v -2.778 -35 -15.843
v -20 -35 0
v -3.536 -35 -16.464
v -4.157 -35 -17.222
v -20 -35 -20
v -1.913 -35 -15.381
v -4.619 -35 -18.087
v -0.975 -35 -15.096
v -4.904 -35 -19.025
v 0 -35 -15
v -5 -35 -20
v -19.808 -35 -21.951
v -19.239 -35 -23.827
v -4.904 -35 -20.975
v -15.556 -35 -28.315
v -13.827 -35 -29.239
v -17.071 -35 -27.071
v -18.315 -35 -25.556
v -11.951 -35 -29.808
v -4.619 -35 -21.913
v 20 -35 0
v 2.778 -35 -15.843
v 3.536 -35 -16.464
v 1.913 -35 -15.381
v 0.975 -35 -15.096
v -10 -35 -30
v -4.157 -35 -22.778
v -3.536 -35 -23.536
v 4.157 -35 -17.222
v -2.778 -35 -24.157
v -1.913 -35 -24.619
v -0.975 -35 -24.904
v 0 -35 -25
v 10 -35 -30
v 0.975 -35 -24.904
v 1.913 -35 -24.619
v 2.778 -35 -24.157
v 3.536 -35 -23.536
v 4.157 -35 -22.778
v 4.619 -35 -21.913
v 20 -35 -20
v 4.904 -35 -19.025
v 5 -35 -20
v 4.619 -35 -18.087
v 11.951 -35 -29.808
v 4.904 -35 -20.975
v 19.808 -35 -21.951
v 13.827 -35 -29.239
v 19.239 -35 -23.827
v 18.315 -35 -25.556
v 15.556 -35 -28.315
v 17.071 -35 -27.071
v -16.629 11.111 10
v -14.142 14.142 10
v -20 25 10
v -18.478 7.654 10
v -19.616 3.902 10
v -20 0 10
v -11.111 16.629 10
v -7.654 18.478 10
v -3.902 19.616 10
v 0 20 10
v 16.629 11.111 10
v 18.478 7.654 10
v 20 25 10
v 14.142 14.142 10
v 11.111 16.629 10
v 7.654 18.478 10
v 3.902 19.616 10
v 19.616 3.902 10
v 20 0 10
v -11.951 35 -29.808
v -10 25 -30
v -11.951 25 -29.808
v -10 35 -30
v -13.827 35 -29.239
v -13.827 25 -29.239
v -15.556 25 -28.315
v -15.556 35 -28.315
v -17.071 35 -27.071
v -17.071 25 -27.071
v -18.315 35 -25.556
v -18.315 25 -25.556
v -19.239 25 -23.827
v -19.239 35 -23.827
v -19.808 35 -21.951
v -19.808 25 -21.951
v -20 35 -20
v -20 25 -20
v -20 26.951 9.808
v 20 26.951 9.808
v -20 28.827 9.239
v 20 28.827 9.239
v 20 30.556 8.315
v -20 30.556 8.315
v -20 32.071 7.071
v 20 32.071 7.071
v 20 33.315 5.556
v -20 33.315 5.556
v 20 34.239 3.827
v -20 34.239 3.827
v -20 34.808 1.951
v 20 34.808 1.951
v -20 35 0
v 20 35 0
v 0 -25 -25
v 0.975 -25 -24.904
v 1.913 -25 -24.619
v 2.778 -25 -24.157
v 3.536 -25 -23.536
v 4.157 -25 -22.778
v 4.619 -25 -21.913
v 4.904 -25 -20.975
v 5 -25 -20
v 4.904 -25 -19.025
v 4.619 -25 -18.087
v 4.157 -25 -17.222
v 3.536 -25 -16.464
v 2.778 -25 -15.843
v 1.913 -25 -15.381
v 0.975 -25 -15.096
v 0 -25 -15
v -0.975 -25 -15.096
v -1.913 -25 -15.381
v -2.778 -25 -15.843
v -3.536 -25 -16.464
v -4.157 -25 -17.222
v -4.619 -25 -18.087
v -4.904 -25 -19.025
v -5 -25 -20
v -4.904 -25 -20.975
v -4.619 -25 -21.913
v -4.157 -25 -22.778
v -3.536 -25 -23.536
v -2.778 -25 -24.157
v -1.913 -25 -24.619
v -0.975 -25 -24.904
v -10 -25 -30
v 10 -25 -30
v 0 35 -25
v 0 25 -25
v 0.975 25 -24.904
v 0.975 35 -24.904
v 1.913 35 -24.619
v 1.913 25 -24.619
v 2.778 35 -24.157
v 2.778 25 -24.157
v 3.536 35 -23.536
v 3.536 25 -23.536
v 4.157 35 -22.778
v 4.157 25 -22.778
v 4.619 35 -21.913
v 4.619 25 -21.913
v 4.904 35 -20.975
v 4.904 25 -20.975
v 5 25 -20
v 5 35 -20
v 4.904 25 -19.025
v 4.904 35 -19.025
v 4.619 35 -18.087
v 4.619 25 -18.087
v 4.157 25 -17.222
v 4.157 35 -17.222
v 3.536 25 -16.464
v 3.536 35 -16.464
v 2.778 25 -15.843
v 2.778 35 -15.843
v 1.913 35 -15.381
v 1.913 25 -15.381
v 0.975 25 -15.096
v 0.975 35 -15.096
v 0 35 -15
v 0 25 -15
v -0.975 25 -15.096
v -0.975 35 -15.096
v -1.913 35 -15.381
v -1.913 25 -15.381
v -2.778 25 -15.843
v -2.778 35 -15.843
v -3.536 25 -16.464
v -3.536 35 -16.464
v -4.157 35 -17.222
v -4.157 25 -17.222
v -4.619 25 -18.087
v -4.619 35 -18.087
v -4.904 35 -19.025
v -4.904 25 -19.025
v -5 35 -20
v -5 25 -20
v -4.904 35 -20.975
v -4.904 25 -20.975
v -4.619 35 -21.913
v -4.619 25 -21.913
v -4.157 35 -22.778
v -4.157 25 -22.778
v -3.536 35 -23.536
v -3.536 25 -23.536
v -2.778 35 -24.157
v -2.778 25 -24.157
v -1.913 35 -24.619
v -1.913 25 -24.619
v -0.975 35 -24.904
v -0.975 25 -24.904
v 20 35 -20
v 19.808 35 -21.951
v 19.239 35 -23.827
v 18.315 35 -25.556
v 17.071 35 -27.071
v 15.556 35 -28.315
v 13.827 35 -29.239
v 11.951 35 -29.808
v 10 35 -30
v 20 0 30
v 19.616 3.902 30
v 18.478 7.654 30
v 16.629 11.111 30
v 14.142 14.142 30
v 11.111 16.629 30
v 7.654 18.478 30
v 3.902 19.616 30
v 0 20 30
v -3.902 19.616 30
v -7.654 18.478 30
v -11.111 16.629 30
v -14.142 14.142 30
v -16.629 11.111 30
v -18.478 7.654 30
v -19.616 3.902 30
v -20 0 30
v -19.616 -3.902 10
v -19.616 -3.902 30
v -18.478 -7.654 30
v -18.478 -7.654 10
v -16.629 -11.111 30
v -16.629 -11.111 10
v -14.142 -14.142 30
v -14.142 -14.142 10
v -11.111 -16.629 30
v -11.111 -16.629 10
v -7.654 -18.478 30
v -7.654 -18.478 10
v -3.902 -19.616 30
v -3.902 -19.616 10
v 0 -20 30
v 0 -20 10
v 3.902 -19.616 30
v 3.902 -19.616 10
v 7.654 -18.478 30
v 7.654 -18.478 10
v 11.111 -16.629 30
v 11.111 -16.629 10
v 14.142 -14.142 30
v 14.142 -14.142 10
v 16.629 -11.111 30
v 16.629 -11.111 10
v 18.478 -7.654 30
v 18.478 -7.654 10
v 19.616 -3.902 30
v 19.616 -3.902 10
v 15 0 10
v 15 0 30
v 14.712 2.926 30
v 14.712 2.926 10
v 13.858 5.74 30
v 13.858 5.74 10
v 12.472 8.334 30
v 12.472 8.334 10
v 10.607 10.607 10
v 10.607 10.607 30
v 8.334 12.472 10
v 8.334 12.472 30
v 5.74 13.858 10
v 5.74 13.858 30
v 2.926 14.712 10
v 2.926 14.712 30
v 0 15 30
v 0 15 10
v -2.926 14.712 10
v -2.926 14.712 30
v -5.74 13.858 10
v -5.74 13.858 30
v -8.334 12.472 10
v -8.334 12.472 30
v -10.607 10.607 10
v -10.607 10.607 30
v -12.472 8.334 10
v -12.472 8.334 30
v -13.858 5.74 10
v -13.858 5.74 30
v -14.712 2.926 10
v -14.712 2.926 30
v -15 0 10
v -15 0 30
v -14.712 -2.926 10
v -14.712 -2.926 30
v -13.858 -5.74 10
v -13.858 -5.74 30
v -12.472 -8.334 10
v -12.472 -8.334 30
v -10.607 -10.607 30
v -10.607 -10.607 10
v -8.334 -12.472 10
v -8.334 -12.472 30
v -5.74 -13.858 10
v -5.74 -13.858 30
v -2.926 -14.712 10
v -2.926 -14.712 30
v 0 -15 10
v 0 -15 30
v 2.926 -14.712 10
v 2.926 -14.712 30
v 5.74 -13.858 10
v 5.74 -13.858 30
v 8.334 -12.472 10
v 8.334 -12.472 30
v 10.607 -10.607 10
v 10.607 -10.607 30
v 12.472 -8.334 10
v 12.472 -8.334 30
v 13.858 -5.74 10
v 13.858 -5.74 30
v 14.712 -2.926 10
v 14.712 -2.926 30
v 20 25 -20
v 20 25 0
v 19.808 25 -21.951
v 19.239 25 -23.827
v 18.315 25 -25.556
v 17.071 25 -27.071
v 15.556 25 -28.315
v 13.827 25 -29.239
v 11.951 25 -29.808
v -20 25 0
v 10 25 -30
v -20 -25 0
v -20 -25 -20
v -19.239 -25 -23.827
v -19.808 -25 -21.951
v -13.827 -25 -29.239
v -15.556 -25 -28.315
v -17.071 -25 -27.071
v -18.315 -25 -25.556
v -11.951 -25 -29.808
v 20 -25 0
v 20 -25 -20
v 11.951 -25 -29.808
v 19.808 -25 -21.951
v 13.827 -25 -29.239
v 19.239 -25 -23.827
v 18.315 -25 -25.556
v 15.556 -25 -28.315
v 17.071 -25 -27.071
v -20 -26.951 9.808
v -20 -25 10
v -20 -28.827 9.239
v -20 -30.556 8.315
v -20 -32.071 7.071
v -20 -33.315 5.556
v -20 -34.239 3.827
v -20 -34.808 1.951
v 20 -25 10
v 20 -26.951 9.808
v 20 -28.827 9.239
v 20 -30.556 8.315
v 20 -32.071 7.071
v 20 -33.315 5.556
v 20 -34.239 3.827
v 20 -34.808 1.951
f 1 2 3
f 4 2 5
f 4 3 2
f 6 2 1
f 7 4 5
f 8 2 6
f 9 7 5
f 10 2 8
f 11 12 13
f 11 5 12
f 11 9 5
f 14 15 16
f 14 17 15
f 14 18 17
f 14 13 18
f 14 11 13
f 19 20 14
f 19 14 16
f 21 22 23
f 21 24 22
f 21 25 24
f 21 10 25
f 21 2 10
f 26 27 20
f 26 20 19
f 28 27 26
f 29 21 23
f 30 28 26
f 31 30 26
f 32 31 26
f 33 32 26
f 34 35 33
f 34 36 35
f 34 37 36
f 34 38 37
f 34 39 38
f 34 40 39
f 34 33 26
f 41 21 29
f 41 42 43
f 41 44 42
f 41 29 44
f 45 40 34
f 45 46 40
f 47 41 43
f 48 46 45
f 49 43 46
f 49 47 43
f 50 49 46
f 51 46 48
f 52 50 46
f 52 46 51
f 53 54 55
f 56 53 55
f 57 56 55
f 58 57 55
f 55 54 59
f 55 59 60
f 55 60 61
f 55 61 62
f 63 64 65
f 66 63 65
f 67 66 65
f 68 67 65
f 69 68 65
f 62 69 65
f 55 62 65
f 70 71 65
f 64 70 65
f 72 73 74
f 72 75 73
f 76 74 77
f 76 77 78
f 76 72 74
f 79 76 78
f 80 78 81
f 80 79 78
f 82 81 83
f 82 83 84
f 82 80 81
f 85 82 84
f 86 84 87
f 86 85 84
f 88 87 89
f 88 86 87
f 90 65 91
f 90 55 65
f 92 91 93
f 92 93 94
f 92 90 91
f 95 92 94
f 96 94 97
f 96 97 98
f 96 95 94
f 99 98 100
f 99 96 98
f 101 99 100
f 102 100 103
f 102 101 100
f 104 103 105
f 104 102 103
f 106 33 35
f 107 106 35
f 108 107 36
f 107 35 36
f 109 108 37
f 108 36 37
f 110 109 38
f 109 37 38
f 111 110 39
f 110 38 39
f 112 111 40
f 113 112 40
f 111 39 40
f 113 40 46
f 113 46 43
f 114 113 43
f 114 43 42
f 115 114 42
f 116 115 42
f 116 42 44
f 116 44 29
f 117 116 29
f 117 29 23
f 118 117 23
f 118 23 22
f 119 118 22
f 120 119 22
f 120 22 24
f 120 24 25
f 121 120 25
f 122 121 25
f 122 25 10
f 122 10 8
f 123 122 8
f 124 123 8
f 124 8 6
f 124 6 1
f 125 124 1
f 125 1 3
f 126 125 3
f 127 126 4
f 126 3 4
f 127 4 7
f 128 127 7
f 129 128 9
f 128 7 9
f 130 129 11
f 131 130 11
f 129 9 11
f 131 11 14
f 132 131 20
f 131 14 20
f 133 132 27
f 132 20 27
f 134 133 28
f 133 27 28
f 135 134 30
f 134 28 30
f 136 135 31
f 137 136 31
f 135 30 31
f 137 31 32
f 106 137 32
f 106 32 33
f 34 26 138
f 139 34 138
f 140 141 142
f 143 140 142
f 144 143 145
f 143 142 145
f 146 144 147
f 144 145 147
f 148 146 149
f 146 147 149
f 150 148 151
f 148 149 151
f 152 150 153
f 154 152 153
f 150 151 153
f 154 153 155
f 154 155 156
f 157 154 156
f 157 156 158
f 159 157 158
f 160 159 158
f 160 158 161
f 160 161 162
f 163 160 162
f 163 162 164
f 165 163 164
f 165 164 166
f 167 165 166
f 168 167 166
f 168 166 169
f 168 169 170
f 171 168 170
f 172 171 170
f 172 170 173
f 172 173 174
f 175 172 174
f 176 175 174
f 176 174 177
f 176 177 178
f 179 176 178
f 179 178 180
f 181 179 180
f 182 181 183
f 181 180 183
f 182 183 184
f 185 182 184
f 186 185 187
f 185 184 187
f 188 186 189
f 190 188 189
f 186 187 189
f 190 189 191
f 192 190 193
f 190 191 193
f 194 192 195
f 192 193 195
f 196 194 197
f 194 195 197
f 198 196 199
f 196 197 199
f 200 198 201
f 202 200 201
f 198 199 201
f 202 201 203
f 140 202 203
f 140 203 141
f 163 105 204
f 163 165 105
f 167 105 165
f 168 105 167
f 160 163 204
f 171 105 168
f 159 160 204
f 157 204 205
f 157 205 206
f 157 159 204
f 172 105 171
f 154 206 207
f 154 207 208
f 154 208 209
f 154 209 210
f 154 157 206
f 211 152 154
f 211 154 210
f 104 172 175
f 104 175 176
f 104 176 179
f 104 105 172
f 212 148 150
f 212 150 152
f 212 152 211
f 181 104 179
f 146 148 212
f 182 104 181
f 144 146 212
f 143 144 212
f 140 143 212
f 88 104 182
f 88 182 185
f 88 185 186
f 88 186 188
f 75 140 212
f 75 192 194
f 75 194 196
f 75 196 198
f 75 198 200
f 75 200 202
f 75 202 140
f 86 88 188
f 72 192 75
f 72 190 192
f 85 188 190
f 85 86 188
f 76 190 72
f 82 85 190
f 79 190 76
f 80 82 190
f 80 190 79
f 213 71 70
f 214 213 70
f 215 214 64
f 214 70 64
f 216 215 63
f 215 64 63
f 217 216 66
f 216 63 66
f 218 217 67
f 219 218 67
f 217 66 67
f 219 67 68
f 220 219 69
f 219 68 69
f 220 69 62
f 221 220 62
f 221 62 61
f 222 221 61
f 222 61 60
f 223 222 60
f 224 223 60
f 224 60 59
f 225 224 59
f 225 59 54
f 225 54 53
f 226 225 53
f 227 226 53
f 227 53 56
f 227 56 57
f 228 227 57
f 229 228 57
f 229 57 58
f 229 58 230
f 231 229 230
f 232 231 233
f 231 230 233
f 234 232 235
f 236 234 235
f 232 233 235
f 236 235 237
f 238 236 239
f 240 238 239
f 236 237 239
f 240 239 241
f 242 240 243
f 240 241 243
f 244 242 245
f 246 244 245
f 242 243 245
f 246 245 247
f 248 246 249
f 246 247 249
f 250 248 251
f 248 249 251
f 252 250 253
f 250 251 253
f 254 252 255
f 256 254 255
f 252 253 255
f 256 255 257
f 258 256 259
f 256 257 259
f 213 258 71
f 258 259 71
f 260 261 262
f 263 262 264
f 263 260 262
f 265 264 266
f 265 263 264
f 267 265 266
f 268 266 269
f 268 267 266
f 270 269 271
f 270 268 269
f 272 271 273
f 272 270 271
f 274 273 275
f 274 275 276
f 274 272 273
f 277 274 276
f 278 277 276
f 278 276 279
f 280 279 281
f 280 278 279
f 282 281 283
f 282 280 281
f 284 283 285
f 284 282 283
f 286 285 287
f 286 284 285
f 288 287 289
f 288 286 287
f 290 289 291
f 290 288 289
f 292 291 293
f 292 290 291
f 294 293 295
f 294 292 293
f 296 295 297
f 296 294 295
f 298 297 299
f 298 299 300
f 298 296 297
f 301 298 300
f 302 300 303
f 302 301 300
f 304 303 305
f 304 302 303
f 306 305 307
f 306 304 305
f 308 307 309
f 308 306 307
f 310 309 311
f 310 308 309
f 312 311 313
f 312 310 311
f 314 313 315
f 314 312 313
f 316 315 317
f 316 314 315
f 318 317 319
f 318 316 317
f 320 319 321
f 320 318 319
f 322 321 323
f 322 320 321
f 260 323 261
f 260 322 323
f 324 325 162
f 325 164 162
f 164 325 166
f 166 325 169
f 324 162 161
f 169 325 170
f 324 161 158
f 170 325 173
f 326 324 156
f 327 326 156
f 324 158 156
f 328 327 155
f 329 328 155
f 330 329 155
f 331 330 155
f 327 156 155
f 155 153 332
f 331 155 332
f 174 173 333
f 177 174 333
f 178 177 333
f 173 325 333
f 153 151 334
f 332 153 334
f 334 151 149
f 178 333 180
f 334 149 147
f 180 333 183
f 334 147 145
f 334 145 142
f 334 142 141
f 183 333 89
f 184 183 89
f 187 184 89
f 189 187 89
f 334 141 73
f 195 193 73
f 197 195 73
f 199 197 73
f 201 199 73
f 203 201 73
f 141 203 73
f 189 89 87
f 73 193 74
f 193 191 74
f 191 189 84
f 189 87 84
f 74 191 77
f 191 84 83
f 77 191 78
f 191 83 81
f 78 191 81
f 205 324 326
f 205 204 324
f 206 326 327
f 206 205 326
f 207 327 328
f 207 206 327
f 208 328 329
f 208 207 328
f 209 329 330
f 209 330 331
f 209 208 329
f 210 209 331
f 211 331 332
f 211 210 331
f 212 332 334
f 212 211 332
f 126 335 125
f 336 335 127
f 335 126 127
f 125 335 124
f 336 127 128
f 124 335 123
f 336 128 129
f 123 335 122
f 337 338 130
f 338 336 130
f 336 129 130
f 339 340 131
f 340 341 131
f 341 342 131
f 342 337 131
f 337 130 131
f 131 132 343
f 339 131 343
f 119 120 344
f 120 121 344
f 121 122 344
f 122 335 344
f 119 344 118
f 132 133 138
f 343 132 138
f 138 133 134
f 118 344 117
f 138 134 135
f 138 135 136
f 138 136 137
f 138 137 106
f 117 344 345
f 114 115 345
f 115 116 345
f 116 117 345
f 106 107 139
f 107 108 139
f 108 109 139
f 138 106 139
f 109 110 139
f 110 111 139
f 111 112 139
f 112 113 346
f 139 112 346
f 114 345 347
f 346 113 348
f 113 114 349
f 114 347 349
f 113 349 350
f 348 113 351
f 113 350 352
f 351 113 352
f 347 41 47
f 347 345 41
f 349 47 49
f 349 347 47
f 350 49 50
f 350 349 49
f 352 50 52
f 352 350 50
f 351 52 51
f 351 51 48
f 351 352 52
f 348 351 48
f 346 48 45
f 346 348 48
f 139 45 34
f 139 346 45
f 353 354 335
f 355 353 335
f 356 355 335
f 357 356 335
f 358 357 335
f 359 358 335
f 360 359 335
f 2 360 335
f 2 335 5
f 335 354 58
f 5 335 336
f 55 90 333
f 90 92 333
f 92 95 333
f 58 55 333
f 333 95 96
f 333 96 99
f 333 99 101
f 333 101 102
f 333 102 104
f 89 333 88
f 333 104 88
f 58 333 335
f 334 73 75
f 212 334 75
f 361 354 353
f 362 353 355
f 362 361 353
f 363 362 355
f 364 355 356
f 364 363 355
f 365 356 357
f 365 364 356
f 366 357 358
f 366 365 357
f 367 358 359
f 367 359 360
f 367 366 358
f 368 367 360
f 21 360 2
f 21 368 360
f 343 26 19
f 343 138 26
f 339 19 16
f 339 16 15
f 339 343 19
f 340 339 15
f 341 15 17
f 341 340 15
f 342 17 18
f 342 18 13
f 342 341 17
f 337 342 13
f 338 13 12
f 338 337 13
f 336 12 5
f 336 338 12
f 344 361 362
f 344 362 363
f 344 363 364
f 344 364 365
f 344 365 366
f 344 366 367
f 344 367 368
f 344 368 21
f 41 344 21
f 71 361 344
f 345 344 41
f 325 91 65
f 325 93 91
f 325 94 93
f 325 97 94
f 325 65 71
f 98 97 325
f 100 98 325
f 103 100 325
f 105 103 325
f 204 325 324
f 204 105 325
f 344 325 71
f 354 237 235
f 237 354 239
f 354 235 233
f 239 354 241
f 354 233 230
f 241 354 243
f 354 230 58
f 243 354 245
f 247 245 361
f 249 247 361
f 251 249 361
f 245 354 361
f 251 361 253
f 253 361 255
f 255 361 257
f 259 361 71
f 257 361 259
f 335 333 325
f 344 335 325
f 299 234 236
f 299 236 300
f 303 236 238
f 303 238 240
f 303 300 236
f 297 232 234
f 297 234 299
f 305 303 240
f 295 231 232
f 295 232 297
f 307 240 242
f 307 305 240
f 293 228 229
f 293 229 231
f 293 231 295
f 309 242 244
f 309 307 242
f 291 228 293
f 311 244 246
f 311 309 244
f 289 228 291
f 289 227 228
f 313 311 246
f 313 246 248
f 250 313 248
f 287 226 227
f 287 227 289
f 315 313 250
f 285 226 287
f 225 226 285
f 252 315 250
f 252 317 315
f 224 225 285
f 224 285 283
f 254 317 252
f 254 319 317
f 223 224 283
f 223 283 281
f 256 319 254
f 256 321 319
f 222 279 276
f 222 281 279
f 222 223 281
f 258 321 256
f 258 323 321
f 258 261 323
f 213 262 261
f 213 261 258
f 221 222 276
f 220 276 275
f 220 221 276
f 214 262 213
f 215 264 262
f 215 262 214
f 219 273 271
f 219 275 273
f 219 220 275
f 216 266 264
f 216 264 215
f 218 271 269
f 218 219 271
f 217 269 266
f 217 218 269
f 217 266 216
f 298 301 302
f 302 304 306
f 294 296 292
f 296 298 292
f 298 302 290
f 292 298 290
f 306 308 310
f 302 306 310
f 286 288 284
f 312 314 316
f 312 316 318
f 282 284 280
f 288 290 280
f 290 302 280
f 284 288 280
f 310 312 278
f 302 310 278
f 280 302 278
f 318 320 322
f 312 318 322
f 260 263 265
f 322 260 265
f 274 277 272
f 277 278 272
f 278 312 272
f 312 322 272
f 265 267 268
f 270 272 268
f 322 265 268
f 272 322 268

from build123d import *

# Parameters (mm, degrees)
SKETCH1_W           = 40
SKETCH1_H           = 50
BOSS_EXTRUDE1_DEPTH = 10
SKETCH2_W           = 40
SKETCH2_H           = 10
BOSS_EXTRUDE2_DEPTH = 20
FILLET1_R           = 10
SKETCH3_R           = 20
SKETCH3_R_2         = 15
BOSS_EXTRUDE3_DEPTH = 20
SKETCH4_R           = 5
CUT_EXTRUDE1_DEPTH  = 79.74007874


with BuildPart() as part:
    # Sketch1 → Boss-Extrude1 (new body)
    with BuildSketch(Plane.XY):
        Rectangle(SKETCH1_W, SKETCH1_H)
    extrude(amount=BOSS_EXTRUDE1_DEPTH)

    # Sketch2 → Boss-Extrude2 (add, symmetric)
    with BuildSketch(Plane(origin=(0, 0, 0), x_dir=(0, 0, -1), z_dir=(1, 0, 0))):
        with Locations((10, 30)):
            Rectangle(SKETCH2_W, SKETCH2_H)
        with Locations((10, -30)):
            Rectangle(SKETCH2_W, SKETCH2_H)
    extrude(amount=BOSS_EXTRUDE2_DEPTH, both=True)

    # Fillet1
    fillet1_edges = [part.edges().sort_by_distance(p)[0] for p in [
        (0, 35, 10),
        (-20, 30, -30),
        (20, 30, -30),
        (0, -35, 10),
        (-20, -30, -30),
        (20, -30, -30),
    ]]
    fillet(fillet1_edges, radius=FILLET1_R)

    # Sketch3 → Boss-Extrude3 (add)
    with BuildSketch(Plane.XY.offset(10)):
        Circle(SKETCH3_R)
        Circle(SKETCH3_R_2, mode=Mode.SUBTRACT)
    extrude(amount=BOSS_EXTRUDE3_DEPTH)

    # Sketch4 → Cut-Extrude1 (cut, through all)
    with BuildSketch(Plane.XZ.offset(35)):
        with Locations(Location((0, -20, 0), (0, 0, 270))):
            Circle(SKETCH4_R)
    extrude(amount=-CUT_EXTRUDE1_DEPTH, mode=Mode.SUBTRACT)


solid = part.part
